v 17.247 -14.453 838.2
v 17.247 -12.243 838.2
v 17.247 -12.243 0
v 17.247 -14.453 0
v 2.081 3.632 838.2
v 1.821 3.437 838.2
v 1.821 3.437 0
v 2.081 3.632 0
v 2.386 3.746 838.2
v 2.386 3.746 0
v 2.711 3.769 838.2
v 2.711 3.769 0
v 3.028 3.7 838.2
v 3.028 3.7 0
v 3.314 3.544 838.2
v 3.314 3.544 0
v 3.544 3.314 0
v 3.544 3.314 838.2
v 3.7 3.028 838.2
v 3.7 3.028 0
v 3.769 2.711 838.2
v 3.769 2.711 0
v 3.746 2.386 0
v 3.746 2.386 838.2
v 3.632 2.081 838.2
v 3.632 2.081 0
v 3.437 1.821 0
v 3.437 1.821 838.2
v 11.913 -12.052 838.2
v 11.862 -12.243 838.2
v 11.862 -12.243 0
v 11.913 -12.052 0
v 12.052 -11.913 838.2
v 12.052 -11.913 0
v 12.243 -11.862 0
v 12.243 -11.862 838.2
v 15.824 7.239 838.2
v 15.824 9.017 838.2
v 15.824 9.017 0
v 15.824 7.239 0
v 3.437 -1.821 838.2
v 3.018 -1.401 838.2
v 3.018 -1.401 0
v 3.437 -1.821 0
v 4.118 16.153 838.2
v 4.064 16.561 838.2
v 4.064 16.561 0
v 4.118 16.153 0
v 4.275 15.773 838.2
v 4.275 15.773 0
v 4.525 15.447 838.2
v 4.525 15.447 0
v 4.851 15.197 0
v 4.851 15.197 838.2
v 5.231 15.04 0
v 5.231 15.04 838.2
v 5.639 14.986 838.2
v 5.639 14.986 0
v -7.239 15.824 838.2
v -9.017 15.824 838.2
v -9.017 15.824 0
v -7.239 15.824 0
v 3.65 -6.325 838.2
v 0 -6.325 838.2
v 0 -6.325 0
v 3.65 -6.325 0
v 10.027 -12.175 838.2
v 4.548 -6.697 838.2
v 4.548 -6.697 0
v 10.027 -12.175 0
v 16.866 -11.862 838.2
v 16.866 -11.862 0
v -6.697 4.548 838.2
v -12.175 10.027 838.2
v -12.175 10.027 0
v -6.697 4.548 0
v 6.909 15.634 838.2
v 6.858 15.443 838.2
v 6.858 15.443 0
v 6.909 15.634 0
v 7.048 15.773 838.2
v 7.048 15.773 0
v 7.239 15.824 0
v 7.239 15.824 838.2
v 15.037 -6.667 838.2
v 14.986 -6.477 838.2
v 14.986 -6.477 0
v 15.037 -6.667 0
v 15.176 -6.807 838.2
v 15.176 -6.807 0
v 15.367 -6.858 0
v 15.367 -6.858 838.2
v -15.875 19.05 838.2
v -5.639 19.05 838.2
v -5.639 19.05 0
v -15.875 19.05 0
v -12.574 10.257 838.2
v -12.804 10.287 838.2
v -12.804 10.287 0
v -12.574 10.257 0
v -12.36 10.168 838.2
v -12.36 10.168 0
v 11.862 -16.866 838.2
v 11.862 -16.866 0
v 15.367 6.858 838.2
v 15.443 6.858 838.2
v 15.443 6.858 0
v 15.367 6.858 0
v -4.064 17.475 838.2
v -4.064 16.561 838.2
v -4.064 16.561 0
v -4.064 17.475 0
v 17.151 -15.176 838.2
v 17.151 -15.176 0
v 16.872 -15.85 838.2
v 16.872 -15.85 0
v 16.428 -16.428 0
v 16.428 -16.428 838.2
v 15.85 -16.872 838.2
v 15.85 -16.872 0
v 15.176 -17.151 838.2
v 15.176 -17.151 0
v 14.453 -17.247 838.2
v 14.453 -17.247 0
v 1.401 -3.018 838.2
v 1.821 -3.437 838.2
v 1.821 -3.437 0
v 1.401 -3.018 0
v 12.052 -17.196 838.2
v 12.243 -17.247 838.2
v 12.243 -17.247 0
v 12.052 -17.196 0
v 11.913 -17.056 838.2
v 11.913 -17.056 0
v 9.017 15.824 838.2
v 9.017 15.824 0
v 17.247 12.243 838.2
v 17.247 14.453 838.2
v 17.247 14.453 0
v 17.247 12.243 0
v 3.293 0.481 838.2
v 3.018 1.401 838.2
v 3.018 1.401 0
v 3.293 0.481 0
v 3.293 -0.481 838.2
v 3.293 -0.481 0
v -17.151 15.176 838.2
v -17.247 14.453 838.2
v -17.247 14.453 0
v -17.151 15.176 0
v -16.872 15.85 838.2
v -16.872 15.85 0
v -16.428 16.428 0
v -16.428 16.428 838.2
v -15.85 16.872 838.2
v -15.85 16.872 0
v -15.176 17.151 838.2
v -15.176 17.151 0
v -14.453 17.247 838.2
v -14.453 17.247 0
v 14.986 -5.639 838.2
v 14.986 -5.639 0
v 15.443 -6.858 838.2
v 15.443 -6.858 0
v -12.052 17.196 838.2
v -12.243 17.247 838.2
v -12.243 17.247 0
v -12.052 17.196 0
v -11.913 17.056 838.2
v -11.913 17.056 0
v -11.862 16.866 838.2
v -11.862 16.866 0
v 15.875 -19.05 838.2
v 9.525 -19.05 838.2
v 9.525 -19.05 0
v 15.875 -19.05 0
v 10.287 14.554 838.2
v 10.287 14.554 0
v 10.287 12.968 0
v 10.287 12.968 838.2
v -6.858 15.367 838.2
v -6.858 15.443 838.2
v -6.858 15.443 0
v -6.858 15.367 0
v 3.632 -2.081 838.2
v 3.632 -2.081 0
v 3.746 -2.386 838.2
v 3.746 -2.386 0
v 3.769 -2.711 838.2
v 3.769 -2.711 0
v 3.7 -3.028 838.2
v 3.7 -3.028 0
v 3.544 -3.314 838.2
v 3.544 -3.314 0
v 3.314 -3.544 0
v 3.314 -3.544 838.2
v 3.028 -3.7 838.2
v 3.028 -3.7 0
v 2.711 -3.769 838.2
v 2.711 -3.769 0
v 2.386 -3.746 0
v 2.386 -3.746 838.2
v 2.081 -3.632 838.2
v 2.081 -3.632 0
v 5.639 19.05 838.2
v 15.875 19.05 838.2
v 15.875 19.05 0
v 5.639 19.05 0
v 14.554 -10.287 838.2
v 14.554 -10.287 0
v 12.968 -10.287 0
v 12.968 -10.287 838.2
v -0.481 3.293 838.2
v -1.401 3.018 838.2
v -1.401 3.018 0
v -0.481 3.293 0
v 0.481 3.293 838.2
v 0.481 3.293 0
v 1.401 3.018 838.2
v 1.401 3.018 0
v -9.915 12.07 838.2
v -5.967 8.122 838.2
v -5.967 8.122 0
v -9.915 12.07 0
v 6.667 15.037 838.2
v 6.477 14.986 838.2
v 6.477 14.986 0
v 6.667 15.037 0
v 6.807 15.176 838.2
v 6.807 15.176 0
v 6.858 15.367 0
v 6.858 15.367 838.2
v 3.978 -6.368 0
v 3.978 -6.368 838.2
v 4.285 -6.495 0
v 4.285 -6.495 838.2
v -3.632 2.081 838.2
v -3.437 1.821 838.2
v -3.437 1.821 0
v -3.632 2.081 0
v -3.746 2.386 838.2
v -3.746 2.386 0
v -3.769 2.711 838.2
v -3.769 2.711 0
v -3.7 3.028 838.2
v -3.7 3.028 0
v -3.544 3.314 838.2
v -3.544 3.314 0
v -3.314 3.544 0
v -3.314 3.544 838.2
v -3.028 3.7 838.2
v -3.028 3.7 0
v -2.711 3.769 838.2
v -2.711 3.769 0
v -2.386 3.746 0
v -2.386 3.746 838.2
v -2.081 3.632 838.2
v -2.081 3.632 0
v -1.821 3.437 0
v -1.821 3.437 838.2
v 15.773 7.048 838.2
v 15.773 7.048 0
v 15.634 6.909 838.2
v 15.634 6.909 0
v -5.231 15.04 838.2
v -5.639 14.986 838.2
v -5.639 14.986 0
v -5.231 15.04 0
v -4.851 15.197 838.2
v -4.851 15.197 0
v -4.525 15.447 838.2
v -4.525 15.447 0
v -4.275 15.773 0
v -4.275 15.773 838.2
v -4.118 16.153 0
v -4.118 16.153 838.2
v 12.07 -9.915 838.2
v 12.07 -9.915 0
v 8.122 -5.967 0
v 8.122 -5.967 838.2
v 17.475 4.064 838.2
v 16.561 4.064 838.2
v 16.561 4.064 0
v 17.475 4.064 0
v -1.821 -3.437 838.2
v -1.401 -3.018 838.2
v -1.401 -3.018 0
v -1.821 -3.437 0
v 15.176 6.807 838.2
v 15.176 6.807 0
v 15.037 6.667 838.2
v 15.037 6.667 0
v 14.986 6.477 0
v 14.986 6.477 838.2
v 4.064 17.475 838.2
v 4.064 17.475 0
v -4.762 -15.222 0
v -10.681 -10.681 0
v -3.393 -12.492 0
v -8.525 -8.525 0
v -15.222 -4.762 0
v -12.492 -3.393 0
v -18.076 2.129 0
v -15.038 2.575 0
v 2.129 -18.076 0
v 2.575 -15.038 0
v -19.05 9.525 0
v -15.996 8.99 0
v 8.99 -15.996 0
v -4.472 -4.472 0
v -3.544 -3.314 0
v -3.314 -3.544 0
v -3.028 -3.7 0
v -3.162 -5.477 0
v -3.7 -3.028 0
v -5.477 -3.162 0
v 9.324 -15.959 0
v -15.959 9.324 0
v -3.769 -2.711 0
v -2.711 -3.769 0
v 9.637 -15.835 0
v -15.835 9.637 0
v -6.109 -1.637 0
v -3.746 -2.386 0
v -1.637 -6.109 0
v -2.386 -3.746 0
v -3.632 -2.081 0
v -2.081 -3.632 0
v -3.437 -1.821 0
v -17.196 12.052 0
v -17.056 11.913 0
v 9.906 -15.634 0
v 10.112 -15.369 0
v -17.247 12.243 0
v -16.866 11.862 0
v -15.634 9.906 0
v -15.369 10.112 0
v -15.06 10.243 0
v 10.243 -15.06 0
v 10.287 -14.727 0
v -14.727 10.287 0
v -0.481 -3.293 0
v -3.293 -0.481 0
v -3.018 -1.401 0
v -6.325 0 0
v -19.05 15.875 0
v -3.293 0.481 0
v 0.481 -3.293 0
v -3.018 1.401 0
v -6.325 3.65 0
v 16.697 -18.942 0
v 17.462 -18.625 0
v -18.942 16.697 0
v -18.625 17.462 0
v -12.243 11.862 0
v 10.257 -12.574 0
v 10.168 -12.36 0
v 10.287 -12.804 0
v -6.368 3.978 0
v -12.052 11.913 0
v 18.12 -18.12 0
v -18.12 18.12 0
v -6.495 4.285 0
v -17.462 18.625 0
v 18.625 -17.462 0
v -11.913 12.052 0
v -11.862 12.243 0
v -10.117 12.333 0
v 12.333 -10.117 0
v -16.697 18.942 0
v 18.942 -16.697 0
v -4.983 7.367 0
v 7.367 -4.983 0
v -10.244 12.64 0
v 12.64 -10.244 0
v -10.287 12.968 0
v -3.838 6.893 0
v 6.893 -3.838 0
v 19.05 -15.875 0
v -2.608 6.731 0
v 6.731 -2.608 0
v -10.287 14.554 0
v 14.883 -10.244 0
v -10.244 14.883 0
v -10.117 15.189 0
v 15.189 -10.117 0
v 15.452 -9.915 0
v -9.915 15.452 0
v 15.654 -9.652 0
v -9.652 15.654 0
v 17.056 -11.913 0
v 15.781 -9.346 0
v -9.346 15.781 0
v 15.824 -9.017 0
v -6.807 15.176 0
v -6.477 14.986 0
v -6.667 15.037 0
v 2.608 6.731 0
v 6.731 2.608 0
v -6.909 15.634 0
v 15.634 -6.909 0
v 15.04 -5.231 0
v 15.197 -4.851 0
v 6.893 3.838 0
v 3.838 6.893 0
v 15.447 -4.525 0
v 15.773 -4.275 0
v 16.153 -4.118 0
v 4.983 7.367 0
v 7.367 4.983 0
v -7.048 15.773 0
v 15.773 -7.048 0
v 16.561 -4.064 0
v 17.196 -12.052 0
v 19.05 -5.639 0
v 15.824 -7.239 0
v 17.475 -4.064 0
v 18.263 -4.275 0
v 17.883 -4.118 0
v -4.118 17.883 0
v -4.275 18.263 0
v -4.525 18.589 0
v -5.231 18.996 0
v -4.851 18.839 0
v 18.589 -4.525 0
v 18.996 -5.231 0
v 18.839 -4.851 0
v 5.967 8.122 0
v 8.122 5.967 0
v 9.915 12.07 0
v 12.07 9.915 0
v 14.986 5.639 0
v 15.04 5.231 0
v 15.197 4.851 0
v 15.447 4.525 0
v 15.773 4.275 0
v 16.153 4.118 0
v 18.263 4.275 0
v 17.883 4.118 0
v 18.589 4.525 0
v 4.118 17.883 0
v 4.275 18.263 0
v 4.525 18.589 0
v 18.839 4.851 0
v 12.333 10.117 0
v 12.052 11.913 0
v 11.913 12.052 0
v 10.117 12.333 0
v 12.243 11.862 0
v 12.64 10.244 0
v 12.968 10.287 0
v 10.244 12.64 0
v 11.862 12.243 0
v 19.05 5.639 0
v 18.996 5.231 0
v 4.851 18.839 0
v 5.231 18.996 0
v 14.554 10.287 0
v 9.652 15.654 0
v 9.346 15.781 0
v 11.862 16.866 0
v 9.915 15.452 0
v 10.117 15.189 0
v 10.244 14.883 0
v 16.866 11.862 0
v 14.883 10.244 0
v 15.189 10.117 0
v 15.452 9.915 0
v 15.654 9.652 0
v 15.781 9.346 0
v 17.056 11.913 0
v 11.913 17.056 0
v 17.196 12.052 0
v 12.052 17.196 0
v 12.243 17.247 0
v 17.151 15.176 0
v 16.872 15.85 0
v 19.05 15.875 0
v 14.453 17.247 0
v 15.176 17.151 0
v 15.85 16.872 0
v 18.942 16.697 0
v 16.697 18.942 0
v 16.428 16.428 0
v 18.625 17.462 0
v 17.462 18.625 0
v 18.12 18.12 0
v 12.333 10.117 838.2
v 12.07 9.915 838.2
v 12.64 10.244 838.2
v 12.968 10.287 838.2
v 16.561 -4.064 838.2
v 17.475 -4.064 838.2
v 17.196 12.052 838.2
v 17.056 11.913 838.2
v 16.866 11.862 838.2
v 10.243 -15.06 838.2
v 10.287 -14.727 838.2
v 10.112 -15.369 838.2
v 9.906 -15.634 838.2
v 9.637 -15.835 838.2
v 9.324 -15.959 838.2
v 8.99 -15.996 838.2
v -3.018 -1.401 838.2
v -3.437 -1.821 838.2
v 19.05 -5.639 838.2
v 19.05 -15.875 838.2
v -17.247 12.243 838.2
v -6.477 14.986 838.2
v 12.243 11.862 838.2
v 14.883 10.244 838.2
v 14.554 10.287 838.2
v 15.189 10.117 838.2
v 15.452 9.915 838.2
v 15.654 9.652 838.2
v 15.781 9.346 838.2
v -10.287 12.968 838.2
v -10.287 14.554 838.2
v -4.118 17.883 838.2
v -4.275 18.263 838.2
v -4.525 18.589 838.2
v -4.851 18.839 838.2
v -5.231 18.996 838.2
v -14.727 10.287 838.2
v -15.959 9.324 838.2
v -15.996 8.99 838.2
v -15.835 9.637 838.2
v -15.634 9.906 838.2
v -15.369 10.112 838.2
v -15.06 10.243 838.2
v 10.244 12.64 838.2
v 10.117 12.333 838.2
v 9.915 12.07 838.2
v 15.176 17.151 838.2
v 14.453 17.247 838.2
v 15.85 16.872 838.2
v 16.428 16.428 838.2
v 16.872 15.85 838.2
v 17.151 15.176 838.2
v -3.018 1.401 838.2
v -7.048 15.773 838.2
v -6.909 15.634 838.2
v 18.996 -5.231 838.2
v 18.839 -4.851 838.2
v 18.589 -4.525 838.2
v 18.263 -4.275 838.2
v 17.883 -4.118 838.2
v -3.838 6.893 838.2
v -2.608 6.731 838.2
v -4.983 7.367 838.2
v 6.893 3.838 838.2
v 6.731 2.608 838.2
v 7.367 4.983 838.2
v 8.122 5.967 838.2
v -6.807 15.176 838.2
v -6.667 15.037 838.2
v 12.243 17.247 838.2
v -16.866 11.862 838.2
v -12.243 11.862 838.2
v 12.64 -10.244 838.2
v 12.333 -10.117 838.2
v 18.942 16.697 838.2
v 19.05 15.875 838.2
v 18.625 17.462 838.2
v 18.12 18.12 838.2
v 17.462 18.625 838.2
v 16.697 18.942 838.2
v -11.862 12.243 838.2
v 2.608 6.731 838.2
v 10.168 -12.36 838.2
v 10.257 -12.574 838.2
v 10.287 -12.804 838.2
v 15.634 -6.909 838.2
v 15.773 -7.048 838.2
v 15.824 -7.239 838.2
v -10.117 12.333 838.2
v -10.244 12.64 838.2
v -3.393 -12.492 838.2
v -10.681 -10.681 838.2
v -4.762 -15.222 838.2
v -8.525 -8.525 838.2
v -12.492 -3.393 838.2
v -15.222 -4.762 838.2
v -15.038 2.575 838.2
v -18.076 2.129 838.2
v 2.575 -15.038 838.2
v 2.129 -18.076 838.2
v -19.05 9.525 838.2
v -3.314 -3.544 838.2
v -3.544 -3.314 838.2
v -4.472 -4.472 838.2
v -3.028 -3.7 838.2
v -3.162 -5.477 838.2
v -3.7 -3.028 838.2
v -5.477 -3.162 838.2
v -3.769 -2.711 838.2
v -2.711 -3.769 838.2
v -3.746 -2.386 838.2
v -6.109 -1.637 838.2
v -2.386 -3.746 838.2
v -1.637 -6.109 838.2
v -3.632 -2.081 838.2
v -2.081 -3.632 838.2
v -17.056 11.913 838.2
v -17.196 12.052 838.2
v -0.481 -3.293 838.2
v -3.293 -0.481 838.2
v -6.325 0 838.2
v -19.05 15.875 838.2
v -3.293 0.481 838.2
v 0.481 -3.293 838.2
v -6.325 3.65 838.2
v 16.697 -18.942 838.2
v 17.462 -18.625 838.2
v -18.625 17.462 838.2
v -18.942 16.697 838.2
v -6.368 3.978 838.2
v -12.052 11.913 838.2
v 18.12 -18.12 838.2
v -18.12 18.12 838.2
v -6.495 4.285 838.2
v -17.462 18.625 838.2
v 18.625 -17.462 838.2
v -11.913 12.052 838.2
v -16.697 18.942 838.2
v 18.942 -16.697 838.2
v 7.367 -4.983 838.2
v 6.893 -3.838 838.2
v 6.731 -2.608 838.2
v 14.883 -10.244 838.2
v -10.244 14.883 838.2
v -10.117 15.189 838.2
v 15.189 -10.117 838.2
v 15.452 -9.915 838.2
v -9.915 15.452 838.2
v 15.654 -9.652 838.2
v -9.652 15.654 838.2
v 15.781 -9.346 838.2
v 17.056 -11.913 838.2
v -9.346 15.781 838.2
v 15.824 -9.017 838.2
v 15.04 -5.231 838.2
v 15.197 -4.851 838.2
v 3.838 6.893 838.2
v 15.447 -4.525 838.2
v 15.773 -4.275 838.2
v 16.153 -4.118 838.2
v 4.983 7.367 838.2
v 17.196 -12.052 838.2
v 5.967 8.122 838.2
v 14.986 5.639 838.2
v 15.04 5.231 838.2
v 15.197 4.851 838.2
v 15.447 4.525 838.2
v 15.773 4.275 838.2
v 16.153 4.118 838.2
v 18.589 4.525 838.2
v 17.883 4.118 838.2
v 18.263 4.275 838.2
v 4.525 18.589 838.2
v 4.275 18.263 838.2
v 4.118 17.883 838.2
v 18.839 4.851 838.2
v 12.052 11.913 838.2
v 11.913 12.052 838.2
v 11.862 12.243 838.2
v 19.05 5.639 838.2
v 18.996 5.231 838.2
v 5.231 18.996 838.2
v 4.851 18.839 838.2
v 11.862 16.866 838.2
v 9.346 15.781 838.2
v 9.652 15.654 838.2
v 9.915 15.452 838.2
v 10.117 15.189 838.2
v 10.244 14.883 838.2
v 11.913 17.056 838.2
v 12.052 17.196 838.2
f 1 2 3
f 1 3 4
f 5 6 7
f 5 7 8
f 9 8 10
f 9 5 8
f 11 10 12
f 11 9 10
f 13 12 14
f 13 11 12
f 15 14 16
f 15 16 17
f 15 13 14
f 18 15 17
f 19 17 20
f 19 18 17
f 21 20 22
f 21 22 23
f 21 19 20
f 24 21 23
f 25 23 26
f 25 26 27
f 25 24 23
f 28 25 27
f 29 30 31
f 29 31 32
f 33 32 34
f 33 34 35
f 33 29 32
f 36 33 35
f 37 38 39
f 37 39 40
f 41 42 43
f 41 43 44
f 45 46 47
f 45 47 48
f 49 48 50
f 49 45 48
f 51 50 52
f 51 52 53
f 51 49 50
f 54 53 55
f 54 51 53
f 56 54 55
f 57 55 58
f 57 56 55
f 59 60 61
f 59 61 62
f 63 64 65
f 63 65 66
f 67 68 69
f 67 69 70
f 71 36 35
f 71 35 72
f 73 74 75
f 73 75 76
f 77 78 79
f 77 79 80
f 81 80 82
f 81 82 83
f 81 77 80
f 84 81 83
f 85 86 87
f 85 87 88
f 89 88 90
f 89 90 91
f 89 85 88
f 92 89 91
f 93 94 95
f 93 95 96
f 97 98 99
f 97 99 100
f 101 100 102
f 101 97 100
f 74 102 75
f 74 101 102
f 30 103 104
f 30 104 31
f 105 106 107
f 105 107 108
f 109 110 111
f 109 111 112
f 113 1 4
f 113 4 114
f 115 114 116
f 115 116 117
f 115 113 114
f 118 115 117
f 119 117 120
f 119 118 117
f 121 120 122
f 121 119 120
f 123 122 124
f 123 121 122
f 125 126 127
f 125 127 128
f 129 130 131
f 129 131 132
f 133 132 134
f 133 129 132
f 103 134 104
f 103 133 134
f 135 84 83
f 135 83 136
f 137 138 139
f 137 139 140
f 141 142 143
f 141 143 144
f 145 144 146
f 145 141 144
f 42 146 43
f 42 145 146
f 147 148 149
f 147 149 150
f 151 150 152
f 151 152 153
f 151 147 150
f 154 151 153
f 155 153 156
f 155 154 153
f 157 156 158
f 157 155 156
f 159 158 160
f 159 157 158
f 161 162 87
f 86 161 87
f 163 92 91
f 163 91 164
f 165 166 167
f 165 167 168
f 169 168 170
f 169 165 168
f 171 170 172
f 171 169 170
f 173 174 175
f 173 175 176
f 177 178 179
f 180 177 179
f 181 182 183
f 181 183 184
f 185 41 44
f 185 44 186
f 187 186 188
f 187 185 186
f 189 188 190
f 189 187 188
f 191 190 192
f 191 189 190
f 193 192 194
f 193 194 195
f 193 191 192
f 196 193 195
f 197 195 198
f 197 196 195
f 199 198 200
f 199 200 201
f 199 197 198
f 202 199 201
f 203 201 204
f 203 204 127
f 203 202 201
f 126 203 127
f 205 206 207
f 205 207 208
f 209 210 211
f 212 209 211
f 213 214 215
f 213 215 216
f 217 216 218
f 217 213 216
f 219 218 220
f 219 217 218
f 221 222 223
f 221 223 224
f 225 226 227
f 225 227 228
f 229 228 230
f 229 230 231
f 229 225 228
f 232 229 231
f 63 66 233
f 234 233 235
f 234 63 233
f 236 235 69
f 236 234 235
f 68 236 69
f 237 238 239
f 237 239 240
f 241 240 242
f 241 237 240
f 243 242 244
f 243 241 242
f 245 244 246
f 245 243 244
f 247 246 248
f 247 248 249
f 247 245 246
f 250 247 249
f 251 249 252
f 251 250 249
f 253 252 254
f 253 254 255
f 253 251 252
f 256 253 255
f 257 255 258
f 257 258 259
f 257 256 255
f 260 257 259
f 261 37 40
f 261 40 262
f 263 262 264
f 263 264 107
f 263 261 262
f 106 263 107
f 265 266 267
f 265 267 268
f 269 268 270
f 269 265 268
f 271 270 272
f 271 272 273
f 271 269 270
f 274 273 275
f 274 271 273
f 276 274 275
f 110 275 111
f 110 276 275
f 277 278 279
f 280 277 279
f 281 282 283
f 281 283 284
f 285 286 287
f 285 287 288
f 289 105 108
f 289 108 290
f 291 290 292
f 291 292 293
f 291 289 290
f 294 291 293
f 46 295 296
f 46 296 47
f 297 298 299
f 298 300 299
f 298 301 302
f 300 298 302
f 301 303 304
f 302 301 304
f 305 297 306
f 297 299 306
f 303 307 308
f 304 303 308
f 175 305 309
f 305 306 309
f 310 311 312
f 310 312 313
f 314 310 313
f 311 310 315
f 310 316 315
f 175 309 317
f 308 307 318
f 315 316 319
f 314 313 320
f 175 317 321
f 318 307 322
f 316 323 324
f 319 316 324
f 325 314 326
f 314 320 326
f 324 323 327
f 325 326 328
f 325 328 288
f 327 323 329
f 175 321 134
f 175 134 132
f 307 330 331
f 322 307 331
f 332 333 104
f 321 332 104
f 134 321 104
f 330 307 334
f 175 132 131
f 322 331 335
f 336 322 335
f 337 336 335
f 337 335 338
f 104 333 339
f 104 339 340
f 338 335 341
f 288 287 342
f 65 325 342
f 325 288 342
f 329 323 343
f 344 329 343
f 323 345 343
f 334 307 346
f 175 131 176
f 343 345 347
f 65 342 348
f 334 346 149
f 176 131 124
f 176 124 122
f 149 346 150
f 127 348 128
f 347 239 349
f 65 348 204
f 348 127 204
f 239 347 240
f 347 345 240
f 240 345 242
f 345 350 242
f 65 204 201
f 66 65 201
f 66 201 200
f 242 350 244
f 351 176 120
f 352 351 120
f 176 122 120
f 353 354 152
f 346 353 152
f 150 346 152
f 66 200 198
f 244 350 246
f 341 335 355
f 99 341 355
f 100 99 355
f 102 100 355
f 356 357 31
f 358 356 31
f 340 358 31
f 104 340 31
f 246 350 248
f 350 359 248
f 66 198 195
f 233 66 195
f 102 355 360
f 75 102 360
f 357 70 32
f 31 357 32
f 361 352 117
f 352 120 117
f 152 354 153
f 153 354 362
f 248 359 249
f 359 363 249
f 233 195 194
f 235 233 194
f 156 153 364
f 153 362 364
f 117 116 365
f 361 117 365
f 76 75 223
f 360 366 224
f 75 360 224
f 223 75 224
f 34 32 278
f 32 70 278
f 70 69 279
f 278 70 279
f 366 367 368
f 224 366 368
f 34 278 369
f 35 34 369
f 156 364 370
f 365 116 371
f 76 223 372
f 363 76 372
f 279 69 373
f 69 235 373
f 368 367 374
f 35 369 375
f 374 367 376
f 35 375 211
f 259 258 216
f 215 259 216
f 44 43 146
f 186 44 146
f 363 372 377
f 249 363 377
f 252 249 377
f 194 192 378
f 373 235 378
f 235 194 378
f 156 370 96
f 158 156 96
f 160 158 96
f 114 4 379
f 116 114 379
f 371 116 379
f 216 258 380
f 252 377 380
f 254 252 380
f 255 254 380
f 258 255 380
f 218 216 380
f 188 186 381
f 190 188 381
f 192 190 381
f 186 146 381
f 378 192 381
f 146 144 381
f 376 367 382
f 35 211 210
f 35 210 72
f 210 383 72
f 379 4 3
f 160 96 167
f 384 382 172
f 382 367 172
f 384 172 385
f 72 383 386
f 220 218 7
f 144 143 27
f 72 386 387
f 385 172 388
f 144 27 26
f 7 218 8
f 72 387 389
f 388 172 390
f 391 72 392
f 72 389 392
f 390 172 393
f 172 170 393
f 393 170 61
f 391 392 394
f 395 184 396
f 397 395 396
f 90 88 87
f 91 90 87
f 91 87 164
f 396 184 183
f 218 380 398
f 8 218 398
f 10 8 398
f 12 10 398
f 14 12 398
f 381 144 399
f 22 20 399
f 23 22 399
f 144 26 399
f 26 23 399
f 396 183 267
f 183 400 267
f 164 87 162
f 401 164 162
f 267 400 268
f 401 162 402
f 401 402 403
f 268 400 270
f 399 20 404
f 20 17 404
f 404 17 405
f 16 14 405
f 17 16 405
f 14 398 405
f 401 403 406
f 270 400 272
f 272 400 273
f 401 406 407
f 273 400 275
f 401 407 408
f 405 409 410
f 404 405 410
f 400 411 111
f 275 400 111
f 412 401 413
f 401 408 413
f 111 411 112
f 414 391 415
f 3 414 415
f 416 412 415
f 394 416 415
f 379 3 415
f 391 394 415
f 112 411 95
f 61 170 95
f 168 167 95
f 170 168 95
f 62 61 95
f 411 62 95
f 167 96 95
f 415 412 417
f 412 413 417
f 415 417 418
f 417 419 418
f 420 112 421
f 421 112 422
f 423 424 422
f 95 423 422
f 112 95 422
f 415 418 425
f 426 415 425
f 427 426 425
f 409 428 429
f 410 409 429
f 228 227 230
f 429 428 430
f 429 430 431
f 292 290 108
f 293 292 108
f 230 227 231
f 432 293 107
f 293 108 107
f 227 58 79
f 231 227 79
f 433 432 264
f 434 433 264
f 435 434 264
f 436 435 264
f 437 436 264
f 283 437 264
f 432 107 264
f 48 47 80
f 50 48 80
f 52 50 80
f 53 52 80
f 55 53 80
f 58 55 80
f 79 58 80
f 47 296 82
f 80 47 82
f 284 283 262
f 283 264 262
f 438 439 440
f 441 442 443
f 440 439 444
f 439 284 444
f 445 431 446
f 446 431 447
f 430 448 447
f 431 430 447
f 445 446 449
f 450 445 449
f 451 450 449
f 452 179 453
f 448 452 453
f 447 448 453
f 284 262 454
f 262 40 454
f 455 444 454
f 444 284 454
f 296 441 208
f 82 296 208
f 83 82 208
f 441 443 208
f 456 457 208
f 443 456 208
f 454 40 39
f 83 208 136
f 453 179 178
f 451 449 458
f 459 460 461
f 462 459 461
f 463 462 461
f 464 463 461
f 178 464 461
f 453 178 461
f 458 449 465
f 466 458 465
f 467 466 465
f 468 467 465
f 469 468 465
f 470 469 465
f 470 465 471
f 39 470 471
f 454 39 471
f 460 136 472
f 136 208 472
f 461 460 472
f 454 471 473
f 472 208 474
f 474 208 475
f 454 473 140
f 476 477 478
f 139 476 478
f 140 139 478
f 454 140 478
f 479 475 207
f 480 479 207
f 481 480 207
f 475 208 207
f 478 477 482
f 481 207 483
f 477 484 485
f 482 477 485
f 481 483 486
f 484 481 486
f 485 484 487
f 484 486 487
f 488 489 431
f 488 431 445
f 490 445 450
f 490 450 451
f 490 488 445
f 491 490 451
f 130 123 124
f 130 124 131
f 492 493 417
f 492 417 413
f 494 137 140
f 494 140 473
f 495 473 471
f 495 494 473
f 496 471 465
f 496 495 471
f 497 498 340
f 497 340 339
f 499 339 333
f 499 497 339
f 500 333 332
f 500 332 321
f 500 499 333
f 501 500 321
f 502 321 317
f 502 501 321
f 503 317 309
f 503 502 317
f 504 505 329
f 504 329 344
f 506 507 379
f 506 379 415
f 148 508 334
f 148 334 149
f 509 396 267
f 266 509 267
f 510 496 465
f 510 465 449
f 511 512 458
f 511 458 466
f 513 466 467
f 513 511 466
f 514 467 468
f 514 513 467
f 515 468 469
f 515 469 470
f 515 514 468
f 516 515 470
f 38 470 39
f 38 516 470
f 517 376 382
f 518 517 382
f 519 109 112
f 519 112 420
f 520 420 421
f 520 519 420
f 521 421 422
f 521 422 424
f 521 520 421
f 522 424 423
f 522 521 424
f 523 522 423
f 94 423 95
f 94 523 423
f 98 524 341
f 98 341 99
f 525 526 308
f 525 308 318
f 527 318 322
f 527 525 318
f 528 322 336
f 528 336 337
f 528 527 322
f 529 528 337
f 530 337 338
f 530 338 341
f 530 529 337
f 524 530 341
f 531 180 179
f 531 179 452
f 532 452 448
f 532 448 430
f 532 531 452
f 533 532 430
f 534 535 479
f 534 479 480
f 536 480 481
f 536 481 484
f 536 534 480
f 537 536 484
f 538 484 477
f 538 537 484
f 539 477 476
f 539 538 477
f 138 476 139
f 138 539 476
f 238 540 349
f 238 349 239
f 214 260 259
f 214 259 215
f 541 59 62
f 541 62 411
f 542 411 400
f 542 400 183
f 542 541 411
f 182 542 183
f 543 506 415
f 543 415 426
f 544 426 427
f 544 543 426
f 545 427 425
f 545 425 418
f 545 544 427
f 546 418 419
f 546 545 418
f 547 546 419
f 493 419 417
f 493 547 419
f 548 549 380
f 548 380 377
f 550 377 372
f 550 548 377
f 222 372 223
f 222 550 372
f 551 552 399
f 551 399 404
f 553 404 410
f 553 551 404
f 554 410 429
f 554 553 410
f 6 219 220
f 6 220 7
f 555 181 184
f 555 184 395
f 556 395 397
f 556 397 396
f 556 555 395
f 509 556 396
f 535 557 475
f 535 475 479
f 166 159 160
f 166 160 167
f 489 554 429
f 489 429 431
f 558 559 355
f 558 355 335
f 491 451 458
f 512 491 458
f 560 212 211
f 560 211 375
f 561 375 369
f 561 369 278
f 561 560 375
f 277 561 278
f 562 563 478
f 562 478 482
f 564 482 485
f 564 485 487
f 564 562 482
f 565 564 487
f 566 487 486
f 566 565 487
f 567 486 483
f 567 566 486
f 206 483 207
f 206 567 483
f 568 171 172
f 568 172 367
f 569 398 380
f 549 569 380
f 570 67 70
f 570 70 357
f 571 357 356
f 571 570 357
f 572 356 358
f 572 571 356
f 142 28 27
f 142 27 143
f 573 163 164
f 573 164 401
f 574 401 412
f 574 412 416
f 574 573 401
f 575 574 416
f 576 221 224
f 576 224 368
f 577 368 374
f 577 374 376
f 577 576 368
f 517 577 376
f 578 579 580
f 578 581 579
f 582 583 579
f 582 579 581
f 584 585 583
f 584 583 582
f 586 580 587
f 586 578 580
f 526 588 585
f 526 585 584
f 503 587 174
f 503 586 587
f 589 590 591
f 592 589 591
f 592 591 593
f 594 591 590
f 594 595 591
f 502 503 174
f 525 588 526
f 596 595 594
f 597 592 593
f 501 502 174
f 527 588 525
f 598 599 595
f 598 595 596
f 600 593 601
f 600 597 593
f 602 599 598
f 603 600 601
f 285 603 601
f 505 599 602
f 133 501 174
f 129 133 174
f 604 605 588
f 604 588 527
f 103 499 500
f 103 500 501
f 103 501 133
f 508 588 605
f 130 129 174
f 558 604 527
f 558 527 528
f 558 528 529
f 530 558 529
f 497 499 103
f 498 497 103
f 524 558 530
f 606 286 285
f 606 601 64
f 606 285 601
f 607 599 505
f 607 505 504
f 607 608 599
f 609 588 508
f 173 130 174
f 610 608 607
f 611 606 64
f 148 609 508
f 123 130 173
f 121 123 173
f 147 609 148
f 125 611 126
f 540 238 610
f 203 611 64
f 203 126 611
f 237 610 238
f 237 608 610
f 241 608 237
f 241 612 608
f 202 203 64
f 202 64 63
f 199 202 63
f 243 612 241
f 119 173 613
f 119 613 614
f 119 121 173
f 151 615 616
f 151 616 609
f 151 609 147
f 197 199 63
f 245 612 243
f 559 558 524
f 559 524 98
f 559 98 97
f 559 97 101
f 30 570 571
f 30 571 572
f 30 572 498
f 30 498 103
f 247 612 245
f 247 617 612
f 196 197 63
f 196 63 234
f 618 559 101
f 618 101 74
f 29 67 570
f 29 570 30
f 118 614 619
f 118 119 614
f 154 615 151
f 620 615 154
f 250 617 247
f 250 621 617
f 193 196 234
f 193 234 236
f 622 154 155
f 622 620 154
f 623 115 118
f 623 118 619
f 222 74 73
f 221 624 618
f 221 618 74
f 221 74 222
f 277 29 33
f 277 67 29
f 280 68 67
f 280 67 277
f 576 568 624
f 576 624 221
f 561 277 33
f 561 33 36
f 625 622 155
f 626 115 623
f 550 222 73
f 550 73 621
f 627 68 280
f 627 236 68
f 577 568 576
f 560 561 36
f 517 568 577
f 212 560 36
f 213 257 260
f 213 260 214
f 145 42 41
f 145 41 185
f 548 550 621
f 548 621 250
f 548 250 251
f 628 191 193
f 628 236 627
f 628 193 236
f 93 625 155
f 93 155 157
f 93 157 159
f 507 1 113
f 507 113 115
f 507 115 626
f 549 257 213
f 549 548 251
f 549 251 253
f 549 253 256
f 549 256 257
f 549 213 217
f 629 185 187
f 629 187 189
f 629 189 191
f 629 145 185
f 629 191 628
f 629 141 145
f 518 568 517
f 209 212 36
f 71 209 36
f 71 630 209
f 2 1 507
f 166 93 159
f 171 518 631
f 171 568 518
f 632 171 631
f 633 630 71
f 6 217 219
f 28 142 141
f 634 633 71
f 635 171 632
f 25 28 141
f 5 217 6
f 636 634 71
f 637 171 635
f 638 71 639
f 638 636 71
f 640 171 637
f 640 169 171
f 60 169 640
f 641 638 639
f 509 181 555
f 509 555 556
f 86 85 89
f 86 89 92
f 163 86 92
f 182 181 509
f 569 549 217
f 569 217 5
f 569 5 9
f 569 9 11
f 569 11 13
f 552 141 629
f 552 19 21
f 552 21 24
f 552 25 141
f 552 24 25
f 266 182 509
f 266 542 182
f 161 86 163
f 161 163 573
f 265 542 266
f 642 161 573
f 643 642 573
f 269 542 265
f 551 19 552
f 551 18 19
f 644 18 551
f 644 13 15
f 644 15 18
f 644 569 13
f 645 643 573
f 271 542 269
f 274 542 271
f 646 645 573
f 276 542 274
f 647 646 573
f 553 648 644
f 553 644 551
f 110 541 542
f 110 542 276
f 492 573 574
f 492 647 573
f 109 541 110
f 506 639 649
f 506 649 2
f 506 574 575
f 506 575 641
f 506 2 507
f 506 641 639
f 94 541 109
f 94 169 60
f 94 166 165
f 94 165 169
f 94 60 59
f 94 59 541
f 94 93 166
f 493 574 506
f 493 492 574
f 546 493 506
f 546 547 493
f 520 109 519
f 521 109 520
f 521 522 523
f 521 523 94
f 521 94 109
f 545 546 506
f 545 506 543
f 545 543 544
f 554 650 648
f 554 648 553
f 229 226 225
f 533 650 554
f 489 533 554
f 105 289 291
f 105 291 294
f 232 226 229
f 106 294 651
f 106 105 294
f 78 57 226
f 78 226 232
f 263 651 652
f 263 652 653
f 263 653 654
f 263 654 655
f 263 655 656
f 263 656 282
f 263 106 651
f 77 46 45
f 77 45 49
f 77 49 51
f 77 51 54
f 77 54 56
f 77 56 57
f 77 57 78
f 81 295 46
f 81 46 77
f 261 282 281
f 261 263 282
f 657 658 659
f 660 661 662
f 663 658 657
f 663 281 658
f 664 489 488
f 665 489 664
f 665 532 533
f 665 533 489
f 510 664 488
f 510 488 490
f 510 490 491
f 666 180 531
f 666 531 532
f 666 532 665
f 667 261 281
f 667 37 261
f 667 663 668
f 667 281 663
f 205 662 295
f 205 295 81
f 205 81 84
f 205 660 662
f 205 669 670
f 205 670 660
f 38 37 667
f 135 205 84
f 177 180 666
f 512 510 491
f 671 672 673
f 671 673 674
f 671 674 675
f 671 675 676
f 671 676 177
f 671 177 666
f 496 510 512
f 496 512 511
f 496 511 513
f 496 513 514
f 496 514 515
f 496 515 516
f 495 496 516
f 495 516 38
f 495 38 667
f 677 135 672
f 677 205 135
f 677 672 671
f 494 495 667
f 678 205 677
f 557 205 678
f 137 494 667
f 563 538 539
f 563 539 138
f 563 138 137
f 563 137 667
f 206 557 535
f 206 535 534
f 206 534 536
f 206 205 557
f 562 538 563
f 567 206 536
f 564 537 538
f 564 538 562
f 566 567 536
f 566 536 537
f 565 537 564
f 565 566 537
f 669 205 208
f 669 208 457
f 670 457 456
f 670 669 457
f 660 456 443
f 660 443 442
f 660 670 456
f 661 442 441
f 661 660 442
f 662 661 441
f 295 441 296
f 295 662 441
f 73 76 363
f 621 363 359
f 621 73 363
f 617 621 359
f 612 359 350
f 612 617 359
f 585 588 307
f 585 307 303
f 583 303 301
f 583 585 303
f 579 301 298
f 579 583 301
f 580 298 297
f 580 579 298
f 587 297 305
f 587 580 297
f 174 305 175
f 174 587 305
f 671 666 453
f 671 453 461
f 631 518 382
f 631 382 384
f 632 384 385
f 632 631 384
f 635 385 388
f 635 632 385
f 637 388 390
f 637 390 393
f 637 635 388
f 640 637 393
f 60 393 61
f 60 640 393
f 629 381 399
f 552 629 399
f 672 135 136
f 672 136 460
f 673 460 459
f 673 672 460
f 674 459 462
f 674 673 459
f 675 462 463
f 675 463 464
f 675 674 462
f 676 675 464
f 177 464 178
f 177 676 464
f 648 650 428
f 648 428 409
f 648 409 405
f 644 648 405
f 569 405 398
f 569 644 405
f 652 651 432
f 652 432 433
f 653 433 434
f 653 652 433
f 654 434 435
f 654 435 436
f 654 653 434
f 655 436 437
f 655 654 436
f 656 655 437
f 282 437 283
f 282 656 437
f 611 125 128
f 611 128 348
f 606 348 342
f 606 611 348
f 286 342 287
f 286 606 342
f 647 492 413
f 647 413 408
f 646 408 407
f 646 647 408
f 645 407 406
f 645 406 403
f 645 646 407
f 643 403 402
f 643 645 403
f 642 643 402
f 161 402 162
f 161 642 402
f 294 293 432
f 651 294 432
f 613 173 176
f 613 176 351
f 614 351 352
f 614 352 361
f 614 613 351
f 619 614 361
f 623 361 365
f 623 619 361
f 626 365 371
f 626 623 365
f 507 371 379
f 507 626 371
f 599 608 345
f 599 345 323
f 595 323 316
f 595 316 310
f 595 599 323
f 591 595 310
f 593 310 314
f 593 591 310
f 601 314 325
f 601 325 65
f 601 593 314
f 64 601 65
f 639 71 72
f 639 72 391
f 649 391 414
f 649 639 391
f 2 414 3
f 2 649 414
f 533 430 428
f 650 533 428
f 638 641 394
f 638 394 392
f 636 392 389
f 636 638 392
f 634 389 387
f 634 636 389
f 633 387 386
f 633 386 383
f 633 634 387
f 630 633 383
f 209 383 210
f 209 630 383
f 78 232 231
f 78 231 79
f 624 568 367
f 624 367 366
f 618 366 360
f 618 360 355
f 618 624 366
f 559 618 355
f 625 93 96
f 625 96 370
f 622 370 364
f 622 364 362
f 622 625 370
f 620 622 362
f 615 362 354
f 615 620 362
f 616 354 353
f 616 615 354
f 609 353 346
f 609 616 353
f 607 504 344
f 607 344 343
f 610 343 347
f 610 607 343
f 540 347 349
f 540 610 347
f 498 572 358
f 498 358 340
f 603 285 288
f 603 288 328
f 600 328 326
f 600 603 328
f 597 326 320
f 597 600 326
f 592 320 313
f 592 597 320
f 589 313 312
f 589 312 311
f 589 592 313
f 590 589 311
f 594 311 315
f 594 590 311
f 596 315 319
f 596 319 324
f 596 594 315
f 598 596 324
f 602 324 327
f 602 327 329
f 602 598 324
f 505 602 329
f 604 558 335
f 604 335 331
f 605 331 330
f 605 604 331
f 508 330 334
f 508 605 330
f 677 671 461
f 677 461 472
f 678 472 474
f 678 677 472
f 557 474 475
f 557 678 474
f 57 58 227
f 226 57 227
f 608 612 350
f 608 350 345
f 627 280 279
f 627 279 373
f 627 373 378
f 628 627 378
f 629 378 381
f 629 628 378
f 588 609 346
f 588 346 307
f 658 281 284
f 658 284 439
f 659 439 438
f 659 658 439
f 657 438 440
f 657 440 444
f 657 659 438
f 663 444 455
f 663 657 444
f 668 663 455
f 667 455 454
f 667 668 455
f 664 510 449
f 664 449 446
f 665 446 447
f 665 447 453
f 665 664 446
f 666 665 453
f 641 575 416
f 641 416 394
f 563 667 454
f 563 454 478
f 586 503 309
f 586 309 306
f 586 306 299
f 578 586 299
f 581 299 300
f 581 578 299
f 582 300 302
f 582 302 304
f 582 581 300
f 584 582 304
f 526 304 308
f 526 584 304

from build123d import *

# Parameters (mm, degrees)
BOSS_EXTRUDE1_DEPTH = 838.2


with BuildPart() as part:
    # Sketch1 → Boss-Extrude1 (new body)
    with BuildSketch(Plane.XY.offset(838.2)):
        with BuildLine():
            Line((-19.05, 15.875), (-19.05, 9.525))
            ThreePointArc((-19.05, 9.525), (-10.680576272, -10.680576272), (9.525, -19.05))
            Line((9.525, -19.05), (15.875, -19.05))
            ThreePointArc((15.875, -19.05), (18.12006403, -18.12006403), (19.05, -15.875))
            Line((19.05, -15.875), (19.05, -5.6388))
            ThreePointArc((19.05, -5.6388), (18.588751759, -4.525248241), (17.4752, -4.064))
            Line((17.4752, -4.064), (16.5608, -4.064))
            ThreePointArc((16.5608, -4.064), (15.447248241, -4.525248241), (14.986, -5.6388))
            Line((14.986, -5.6388), (14.986, -6.476993142))
            ThreePointArc((14.986, -6.476993142), (15.097592316, -6.746400826), (15.367, -6.857993142))
            Line((15.367, -6.857993142), (15.44319365, -6.857993142))
            ThreePointArc((15.44319365, -6.857993142), (15.712601334, -6.969585458), (15.82419365, -7.238993142))
            Line((15.82419365, -7.238993142), (15.82419365, -9.017))
            ThreePointArc((15.82419365, -9.017), (15.452219262, -9.915025612), (14.55419365, -10.287))
            Line((14.55419365, -10.287), (12.968312693, -10.287))
            ThreePointArc((12.968312693, -10.287), (12.482304734, -10.190327006), (12.070287081, -9.915025612))
            Line((12.070287081, -9.915025612), (8.122184211, -5.966922742))
            ThreePointArc((8.122184211, -5.966922742), (7.092556996, -4.425976719), (6.731, -2.608306952))
            Line((6.731, -2.608306952), (6.731, 2.608306952))
            ThreePointArc((6.731, 2.608306952), (7.092556996, 4.425976719), (8.122184211, 5.966922742))
            Line((8.122184211, 5.966922742), (12.070287081, 9.915025612))
            ThreePointArc((12.070287081, 9.915025612), (12.482304734, 10.190327006), (12.968312693, 10.287))
            Line((12.968312693, 10.287), (14.55419365, 10.287))
            ThreePointArc((14.55419365, 10.287), (15.452219262, 9.915025612), (15.82419365, 9.017))
            Line((15.82419365, 9.017), (15.82419365, 7.238993142))
            ThreePointArc((15.82419365, 7.238993142), (15.712601334, 6.969585458), (15.44319365, 6.857993142))
            Line((15.44319365, 6.857993142), (15.367, 6.857993142))
            ThreePointArc((15.367, 6.857993142), (15.097592316, 6.746400826), (14.986, 6.476993142))
            Line((14.986, 6.476993142), (14.986, 5.6388))
            ThreePointArc((14.986, 5.6388), (15.447248241, 4.525248241), (16.5608, 4.064))
            Line((16.5608, 4.064), (17.4752, 4.064))
            ThreePointArc((17.4752, 4.064), (18.588751759, 4.525248241), (19.05, 5.6388))
            Line((19.05, 5.6388), (19.05, 15.875))
            ThreePointArc((19.05, 15.875), (18.12006403, 18.12006403), (15.875, 19.05))
            Line((15.875, 19.05), (5.6388, 19.05))
            ThreePointArc((5.6388, 19.05), (4.525248241, 18.588751759), (4.064, 17.4752))
            Line((4.064, 17.4752), (4.064, 16.5608))
            ThreePointArc((4.064, 16.5608), (4.525248241, 15.447248241), (5.6388, 14.986))
            Line((5.6388, 14.986), (6.476993142, 14.986))
            ThreePointArc((6.476993142, 14.986), (6.746400826, 15.097592316), (6.857993142, 15.367))
            Line((6.857993142, 15.367), (6.857993142, 15.44319365))
            ThreePointArc((6.857993142, 15.44319365), (6.969585458, 15.712601334), (7.238993142, 15.82419365))
            Line((7.238993142, 15.82419365), (9.017, 15.82419365))
            ThreePointArc((9.017, 15.82419365), (9.915025612, 15.452219262), (10.287, 14.55419365))
            Line((10.287, 14.55419365), (10.287, 12.968312693))
            ThreePointArc((10.287, 12.968312693), (10.190327006, 12.482304734), (9.915025612, 12.070287081))
            Line((9.915025612, 12.070287081), (5.966922742, 8.122184211))
            ThreePointArc((5.966922742, 8.122184211), (4.425976719, 7.092556996), (2.608306952, 6.731))
            Line((2.608306952, 6.731), (-2.608306952, 6.731))
            ThreePointArc((-2.608306952, 6.731), (-4.425976719, 7.092556996), (-5.966922742, 8.122184211))
            Line((-5.966922742, 8.122184211), (-9.915025612, 12.070287081))
            ThreePointArc((-9.915025612, 12.070287081), (-10.190327006, 12.482304734), (-10.287, 12.968312693))
            Line((-10.287, 12.968312693), (-10.287, 14.55419365))
            ThreePointArc((-10.287, 14.55419365), (-9.915025612, 15.452219262), (-9.017, 15.82419365))
            Line((-9.017, 15.82419365), (-7.238993142, 15.82419365))
            ThreePointArc((-7.238993142, 15.82419365), (-6.969585458, 15.712601334), (-6.857993142, 15.44319365))
            Line((-6.857993142, 15.44319365), (-6.857993142, 15.367))
            ThreePointArc((-6.857993142, 15.367), (-6.746400826, 15.097592316), (-6.476993142, 14.986))
            Line((-6.476993142, 14.986), (-5.6388, 14.986))
            ThreePointArc((-5.6388, 14.986), (-4.525248241, 15.447248241), (-4.064, 16.5608))
            Line((-4.064, 16.5608), (-4.064, 17.4752))
            ThreePointArc((-4.064, 17.4752), (-4.525248241, 18.588751759), (-5.6388, 19.05))
            Line((-5.6388, 19.05), (-15.875, 19.05))
            ThreePointArc((-15.875, 19.05), (-18.12006403, 18.12006403), (-19.05, 15.875))
        make_face()
        with BuildLine():
            Line((-14.4526, 17.2466), (-12.2428, 17.2466))
            ThreePointArc((-12.2428, 17.2466), (-11.973392316, 17.135007684), (-11.8618, 16.8656))
            Line((-11.8618, 16.8656), (-11.8618, 12.2428))
            ThreePointArc((-11.8618, 12.2428), (-11.973392316, 11.973392316), (-12.2428, 11.8618))
            Line((-12.2428, 11.8618), (-16.8656, 11.8618))
            ThreePointArc((-16.8656, 11.8618), (-17.135007684, 11.973392316), (-17.2466, 12.2428))
            Line((-17.2466, 12.2428), (-17.2466, 14.4526))
            ThreePointArc((-17.2466, 14.4526), (-16.428256347, 16.428256347), (-14.4526, 17.2466))
        make_face(mode=Mode.SUBTRACT)
        with BuildLine():
            Line((-14.726680045, 10.287), (-12.804003164, 10.287))
            ThreePointArc((-12.804003164, 10.287), (-12.463797593, 10.219328904), (-12.175385236, 10.026617928))
            Line((-12.175385236, 10.026617928), (-6.696574388, 4.547807081))
            ThreePointArc((-6.696574388, 4.547807081), (-6.421272994, 4.135789428), (-6.3246, 3.649781469))
            Line((-6.3246, 3.649781469), (-6.3246, 0))
            ThreePointArc((-6.3246, 0), (-4.472167548, -4.472167548), (0, -6.3246))
            Line((0, -6.3246), (3.649781469, -6.3246))
            ThreePointArc((3.649781469, -6.3246), (4.135789428, -6.421272994), (4.547807081, -6.696574388))
            Line((4.547807081, -6.696574388), (10.026617928, -12.175385236))
            ThreePointArc((10.026617928, -12.175385236), (10.219328904, -12.463797593), (10.287, -12.804003164))
            Line((10.287, -12.804003164), (10.287, -14.726680045))
            ThreePointArc((10.287, -14.726680045), (9.905572448, -15.634060343), (8.990403141, -15.996401513))
            ThreePointArc((8.990403141, -15.996401513), (-8.525314803, -8.525314803), (-15.996401513, 8.990403141))
            ThreePointArc((-15.996401513, 8.990403141), (-15.634060343, 9.905572448), (-14.726680045, 10.287))
        make_face(mode=Mode.SUBTRACT)
        with BuildLine():
            Line((-3.437208141, -1.820762039), (-3.017877069, -1.401430967))
            ThreePointArc((-3.017877069, -1.401430967), (-3.3274, 0), (-3.017877069, 1.401430967))
            Line((-3.017877069, 1.401430967), (-3.437208141, 1.820762039))
            ThreePointArc((-3.437208141, 1.820762039), (-3.437208141, 3.437208141), (-1.820762039, 3.437208141))
            Line((-1.820762039, 3.437208141), (-1.401430967, 3.017877069))
            ThreePointArc((-1.401430967, 3.017877069), (0, 3.3274), (1.401430967, 3.017877069))
            Line((1.401430967, 3.017877069), (1.820762039, 3.437208141))
            ThreePointArc((1.820762039, 3.437208141), (3.437208141, 3.437208141), (3.437208141, 1.820762039))
            Line((3.437208141, 1.820762039), (3.017877069, 1.401430967))
            ThreePointArc((3.017877069, 1.401430967), (3.3274, 0), (3.017877069, -1.401430967))
            Line((3.017877069, -1.401430967), (3.437208141, -1.820762039))
            ThreePointArc((3.437208141, -1.820762039), (3.437208141, -3.437208141), (1.820762039, -3.437208141))
            Line((1.820762039, -3.437208141), (1.401430967, -3.017877069))
            ThreePointArc((1.401430967, -3.017877069), (0, -3.3274), (-1.401430967, -3.017877069))
            Line((-1.401430967, -3.017877069), (-1.820762039, -3.437208141))
            ThreePointArc((-1.820762039, -3.437208141), (-3.437208141, -3.437208141), (-3.437208141, -1.820762039))
        make_face(mode=Mode.SUBTRACT)
        with BuildLine():
            Line((12.2428, 17.2466), (14.4526, 17.2466))
            ThreePointArc((14.4526, 17.2466), (16.428256347, 16.428256347), (17.2466, 14.4526))
            Line((17.2466, 14.4526), (17.2466, 12.2428))
            ThreePointArc((17.2466, 12.2428), (17.135007684, 11.973392316), (16.8656, 11.8618))
            Line((16.8656, 11.8618), (12.2428, 11.8618))
            ThreePointArc((12.2428, 11.8618), (11.973392316, 11.973392316), (11.8618, 12.2428))
            Line((11.8618, 12.2428), (11.8618, 16.8656))
            ThreePointArc((11.8618, 16.8656), (11.973392316, 17.135007684), (12.2428, 17.2466))
        make_face(mode=Mode.SUBTRACT)
        with BuildLine():
            Line((11.8618, -16.8656), (11.8618, -12.2428))
            ThreePointArc((11.8618, -12.2428), (11.973392316, -11.973392316), (12.2428, -11.8618))
            Line((12.2428, -11.8618), (16.8656, -11.8618))
            ThreePointArc((16.8656, -11.8618), (17.135007684, -11.973392316), (17.2466, -12.2428))
            Line((17.2466, -12.2428), (17.2466, -14.4526))
            ThreePointArc((17.2466, -14.4526), (16.428256347, -16.428256347), (14.4526, -17.2466))
            Line((14.4526, -17.2466), (12.2428, -17.2466))
            ThreePointArc((12.2428, -17.2466), (11.973392316, -17.135007684), (11.8618, -16.8656))
        make_face(mode=Mode.SUBTRACT)
    extrude(amount=-BOSS_EXTRUDE1_DEPTH)


solid = part.part
